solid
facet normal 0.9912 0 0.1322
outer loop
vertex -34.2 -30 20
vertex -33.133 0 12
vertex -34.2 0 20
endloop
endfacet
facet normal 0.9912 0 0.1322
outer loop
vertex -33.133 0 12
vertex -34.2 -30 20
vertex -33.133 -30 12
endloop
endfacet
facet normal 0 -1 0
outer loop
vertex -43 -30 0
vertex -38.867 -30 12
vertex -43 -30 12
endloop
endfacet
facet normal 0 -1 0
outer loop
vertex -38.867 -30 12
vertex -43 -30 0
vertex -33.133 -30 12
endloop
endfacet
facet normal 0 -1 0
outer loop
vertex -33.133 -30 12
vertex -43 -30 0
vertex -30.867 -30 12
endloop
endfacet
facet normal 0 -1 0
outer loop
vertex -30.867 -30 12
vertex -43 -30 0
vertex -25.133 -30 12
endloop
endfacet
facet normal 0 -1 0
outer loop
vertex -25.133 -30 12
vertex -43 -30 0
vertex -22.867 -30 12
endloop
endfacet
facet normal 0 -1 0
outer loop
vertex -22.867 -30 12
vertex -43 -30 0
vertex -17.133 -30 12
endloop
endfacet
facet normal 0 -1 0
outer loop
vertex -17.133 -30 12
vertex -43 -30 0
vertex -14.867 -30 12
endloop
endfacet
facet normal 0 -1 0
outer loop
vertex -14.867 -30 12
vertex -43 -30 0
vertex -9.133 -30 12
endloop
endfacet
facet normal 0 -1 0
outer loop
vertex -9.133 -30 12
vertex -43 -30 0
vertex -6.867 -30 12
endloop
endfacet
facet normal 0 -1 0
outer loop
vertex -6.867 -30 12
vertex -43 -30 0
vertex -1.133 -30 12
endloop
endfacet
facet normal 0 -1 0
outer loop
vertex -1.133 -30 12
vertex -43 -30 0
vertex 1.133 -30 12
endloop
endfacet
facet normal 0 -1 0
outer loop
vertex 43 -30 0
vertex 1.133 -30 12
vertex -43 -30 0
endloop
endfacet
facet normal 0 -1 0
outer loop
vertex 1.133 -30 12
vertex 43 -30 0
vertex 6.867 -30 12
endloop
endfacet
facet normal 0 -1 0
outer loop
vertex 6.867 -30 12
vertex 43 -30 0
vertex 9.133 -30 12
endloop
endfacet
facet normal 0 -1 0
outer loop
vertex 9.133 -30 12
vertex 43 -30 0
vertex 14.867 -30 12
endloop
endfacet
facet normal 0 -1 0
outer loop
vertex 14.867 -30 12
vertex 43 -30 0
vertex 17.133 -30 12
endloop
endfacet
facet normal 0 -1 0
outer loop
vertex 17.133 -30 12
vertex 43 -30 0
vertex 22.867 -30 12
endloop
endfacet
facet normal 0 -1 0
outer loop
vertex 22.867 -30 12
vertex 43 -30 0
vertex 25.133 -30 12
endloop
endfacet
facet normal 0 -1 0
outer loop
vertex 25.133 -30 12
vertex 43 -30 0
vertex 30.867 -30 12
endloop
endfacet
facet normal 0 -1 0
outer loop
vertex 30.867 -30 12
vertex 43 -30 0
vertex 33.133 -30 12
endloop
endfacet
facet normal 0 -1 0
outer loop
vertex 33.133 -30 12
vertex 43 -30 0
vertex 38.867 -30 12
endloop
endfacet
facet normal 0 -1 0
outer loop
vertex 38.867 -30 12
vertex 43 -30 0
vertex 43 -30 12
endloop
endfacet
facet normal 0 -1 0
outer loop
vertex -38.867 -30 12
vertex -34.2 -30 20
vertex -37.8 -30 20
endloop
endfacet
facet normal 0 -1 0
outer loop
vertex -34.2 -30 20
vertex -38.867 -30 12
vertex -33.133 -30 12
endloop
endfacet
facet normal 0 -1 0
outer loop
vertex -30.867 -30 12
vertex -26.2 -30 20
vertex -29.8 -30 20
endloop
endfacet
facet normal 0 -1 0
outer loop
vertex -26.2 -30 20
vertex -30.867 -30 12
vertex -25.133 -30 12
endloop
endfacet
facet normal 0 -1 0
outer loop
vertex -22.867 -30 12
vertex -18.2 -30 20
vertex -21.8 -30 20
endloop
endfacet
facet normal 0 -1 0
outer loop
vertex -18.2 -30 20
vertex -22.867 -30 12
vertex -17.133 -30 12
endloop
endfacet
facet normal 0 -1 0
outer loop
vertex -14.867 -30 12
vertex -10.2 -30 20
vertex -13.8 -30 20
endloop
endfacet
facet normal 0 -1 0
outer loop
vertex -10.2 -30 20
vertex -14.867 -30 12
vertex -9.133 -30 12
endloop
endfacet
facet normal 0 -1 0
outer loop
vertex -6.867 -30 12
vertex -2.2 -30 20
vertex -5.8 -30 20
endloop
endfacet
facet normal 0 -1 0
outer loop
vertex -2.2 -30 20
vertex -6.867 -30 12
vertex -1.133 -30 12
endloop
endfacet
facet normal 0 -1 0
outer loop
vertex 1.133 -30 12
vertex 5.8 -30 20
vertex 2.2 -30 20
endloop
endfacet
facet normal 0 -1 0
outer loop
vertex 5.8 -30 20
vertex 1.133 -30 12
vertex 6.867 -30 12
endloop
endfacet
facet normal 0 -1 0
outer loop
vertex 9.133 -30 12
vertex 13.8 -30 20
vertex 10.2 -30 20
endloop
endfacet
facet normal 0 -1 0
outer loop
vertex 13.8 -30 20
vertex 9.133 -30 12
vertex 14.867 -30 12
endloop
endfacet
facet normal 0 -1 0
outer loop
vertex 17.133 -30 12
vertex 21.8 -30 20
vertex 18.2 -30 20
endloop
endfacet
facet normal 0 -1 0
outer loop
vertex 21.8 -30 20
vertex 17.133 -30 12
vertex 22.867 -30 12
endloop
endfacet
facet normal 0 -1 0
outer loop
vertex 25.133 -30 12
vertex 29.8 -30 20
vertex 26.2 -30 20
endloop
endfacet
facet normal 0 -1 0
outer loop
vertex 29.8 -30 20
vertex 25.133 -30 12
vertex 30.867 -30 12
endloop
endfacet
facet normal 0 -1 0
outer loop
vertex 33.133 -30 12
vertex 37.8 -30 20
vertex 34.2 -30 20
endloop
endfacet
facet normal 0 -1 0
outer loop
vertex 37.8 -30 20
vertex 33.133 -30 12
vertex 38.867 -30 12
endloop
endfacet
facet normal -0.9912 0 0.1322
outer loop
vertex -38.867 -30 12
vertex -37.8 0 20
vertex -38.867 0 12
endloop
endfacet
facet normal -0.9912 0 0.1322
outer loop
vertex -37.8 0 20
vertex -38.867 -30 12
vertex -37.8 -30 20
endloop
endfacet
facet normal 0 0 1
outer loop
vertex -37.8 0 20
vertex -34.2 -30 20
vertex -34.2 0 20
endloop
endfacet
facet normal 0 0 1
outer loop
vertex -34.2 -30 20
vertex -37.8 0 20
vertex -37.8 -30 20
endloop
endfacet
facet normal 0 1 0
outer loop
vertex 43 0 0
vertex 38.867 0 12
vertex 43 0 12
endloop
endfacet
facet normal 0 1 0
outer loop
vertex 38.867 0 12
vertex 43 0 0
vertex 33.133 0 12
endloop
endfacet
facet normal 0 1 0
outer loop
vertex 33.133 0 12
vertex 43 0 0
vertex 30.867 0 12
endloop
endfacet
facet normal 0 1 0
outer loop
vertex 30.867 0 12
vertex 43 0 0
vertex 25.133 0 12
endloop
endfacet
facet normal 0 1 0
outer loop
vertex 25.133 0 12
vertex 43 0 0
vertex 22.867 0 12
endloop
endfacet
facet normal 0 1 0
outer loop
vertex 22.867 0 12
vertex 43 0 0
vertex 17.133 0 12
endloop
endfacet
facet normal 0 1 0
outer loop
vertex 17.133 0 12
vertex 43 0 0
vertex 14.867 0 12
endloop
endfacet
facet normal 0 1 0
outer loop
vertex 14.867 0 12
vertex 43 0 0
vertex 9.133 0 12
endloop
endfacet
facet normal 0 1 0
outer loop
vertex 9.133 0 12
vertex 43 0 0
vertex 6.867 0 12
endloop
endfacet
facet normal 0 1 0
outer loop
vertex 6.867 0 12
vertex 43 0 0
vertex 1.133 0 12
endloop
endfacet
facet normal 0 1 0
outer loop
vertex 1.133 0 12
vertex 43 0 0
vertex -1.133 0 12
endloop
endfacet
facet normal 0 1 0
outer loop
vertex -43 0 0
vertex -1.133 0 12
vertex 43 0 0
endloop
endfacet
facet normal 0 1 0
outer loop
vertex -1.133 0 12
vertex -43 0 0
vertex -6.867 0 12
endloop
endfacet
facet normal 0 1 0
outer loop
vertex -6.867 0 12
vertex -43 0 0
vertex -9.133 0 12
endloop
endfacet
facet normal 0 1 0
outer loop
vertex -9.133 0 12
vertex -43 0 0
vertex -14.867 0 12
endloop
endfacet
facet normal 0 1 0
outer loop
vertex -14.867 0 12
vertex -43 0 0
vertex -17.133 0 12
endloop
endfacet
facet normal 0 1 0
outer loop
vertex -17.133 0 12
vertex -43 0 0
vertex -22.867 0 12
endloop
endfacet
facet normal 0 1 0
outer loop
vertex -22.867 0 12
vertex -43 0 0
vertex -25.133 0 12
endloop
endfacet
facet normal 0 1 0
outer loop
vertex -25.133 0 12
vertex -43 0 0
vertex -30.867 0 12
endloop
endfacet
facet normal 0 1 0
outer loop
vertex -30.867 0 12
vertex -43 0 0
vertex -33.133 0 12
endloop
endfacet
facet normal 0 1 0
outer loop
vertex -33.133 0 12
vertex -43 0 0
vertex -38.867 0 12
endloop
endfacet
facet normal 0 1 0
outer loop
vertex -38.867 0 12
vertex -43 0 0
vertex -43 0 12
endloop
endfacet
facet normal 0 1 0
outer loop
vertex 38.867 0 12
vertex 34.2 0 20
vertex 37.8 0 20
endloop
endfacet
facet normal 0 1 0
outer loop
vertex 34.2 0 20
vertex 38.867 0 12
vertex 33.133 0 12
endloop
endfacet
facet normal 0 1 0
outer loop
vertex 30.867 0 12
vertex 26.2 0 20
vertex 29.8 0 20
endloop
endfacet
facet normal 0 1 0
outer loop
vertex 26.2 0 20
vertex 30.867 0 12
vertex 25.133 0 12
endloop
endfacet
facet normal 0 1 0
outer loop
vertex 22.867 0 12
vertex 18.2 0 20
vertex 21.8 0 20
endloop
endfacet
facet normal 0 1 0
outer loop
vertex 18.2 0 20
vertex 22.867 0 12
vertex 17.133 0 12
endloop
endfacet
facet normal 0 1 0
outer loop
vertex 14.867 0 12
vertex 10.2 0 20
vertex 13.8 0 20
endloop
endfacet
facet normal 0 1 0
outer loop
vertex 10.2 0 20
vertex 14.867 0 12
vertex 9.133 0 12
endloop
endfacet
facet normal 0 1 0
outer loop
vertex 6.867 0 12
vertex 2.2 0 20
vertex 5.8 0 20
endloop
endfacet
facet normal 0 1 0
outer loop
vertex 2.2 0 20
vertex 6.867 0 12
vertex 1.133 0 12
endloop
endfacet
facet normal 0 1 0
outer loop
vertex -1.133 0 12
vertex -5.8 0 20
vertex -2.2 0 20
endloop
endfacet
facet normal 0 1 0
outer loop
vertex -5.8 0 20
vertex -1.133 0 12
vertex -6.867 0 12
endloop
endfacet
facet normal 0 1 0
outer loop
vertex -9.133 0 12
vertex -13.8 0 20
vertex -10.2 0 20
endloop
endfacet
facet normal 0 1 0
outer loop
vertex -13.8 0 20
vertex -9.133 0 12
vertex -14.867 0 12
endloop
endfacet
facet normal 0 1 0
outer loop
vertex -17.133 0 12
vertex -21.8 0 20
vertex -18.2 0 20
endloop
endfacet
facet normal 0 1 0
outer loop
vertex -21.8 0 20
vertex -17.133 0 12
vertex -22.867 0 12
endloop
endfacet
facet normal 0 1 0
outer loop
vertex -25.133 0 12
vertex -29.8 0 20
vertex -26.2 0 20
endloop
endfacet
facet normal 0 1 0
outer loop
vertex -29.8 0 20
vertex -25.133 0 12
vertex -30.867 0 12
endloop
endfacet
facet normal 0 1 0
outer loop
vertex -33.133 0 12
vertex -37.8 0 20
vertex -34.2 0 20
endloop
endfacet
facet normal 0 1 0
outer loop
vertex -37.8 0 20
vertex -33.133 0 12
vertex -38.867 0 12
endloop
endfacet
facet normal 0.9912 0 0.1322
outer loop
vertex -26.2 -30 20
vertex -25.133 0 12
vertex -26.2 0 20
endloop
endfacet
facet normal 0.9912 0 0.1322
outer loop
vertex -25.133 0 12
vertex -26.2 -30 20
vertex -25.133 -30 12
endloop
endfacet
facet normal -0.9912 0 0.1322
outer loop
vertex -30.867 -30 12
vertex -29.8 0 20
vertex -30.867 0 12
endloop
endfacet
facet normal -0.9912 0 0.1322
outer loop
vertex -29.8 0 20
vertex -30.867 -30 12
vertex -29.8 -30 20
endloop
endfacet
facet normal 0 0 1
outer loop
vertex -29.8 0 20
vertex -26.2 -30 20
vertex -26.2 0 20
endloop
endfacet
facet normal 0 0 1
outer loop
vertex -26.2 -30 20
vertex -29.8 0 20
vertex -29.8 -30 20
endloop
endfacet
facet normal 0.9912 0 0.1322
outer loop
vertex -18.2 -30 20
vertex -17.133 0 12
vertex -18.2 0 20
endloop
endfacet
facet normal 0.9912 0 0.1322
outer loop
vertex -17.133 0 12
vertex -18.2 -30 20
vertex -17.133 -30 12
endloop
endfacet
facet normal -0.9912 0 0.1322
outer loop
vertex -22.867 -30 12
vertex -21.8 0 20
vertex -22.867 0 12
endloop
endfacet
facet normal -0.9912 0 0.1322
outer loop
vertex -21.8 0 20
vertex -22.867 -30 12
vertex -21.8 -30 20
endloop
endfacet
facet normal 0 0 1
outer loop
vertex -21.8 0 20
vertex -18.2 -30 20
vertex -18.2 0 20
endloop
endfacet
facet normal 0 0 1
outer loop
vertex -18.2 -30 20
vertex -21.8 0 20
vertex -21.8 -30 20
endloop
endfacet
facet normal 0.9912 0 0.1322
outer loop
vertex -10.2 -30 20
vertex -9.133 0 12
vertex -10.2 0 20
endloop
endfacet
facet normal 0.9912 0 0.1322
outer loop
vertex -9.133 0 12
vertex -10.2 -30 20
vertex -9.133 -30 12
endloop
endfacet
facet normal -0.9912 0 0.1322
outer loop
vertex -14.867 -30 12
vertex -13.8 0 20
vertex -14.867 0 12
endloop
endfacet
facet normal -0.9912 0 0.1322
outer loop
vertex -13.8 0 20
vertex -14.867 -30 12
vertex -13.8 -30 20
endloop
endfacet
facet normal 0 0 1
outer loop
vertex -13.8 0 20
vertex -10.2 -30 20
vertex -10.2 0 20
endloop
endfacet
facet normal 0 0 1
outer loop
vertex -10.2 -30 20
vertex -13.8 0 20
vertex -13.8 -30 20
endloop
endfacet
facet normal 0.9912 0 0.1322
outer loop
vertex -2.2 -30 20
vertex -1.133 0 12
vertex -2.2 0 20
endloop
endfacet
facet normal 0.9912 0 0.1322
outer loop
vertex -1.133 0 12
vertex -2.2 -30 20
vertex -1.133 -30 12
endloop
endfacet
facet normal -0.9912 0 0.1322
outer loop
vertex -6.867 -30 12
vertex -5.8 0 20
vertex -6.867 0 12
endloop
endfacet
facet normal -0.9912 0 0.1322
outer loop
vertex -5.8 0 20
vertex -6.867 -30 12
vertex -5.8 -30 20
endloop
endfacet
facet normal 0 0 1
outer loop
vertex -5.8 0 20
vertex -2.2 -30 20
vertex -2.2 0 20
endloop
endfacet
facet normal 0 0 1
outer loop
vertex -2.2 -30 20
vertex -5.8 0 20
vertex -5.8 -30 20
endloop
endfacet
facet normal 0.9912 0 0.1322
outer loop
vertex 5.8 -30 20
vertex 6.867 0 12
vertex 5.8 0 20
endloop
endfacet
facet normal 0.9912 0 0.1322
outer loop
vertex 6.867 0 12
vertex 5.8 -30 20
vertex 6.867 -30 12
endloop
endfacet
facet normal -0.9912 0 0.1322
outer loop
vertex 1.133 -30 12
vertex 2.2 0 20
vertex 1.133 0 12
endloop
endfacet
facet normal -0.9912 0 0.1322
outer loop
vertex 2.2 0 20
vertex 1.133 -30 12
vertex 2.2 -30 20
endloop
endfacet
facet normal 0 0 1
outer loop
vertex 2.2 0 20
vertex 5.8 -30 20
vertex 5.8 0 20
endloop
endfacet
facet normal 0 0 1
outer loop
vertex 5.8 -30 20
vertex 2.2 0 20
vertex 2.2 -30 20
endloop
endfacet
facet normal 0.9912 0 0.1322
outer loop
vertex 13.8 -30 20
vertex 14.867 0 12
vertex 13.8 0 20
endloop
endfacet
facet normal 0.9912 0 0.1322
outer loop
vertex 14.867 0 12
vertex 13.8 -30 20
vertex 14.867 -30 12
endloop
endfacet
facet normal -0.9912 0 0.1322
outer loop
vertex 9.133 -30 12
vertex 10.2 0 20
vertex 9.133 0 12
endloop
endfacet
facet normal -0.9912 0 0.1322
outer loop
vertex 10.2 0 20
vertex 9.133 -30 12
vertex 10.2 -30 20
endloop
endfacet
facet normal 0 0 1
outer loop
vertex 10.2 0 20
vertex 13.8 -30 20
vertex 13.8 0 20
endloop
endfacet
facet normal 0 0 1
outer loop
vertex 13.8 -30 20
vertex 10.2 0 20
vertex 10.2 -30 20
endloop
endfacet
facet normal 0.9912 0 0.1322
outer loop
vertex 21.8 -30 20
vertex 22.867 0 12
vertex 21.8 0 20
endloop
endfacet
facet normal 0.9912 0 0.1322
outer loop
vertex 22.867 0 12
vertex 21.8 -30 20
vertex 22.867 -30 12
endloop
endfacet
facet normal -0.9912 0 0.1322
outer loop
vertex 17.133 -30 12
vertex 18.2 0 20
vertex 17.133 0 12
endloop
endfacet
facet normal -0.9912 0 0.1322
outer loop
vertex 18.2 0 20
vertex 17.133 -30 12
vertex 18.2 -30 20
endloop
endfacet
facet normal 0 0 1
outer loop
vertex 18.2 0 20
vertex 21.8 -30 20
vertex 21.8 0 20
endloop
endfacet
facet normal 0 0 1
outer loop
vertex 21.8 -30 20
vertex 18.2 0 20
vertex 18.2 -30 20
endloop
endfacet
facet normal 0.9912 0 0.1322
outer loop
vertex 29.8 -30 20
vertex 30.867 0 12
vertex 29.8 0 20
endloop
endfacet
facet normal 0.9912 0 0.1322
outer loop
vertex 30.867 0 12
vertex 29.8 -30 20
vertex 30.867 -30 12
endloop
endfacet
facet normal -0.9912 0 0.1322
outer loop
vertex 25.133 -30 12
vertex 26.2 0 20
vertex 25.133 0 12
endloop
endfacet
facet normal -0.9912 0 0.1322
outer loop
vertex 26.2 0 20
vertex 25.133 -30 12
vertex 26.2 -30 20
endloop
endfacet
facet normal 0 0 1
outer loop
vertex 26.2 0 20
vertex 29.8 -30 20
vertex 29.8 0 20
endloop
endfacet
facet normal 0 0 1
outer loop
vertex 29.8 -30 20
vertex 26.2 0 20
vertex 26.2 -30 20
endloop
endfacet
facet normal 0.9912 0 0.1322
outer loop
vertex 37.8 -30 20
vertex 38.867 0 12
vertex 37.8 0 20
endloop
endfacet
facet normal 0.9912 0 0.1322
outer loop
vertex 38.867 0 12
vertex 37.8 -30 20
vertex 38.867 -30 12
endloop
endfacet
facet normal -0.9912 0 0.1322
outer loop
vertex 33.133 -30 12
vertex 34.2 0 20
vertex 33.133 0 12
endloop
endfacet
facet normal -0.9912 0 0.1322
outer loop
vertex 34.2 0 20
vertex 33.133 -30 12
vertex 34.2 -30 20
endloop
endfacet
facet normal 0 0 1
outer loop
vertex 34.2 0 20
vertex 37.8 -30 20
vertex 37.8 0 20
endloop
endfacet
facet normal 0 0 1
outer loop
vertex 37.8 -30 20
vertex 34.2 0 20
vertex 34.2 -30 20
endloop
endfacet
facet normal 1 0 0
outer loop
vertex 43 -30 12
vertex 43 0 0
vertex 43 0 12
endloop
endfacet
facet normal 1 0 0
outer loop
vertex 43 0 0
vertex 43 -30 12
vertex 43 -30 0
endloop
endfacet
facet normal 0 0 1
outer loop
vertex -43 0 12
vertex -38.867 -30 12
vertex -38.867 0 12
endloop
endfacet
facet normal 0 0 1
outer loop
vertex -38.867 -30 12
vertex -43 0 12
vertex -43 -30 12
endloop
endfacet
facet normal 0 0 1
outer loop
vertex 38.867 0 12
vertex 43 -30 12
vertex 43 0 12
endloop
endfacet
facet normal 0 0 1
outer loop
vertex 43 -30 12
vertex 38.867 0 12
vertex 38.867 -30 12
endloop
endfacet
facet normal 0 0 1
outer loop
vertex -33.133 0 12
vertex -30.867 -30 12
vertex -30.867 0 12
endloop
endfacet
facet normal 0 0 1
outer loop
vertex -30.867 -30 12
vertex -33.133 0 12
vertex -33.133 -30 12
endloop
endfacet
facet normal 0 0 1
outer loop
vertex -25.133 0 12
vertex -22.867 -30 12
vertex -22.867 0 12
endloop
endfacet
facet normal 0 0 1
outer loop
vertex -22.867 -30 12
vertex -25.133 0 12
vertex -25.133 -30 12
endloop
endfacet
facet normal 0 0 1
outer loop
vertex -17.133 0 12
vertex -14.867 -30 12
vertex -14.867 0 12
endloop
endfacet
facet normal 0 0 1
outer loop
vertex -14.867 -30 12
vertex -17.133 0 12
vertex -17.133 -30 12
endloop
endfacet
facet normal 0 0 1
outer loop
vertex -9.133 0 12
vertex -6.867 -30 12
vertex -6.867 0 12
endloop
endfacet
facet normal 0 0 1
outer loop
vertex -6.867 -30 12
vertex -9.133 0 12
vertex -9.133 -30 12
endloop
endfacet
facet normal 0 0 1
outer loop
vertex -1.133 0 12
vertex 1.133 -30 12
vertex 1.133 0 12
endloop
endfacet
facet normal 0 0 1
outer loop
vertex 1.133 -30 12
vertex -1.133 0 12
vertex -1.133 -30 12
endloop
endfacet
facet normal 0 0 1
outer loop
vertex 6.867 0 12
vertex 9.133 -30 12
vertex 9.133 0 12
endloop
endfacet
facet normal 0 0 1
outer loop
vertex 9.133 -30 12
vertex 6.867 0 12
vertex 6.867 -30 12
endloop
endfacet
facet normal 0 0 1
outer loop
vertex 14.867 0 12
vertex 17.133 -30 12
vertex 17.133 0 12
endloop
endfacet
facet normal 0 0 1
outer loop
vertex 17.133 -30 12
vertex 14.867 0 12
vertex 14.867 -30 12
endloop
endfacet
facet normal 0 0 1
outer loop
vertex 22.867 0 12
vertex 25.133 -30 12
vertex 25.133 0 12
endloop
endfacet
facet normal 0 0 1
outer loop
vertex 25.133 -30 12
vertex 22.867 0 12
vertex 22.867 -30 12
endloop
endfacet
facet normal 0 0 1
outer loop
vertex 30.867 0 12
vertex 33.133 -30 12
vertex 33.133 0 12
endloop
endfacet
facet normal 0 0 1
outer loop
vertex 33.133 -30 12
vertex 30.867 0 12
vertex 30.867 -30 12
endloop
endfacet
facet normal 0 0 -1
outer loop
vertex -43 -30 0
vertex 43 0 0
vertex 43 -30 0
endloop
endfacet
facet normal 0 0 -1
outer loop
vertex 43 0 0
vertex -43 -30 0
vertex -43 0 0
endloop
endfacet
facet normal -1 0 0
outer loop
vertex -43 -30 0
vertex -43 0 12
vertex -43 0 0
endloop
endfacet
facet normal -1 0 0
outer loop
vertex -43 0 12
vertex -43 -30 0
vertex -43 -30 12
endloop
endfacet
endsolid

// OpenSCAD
$fn = 32;

// ----------------------------------------------------------------------
// Toothed rack, 10 teeth
// 8 mm pitch, 8 mm teeth
// ----------------------------------------------------------------------

// --- parameters (mm) ---
bar_w = 30;     // bar width (Y)
bar_h = 12;     // bar height (Z)
teeth = 10;     // number of teeth
pitch = 8;      // tooth pitch
tooth_h = 8;    // tooth height above the bar
root_w = 6;     // tooth width at the root
crest_w = 3.6;  // tooth width at the crest

// --- derived feature positions (mm) ---
span = (teeth - 1) * pitch;  // = 72   distance between the outer teeth
bar_l = span + root_w + 8;   // = 86   bar length: teeth plus 4 mm at each end
tooth_x = -span / 2;         // = -36   X of the first tooth
height = bar_h + tooth_h;    // = 20   overall height
feature_centers = [
  [tooth_x + 0 * pitch, -bar_w / 2],
  [tooth_x + 1 * pitch, -bar_w / 2],
  [tooth_x + 2 * pitch, -bar_w / 2],
  [tooth_x + 3 * pitch, -bar_w / 2],
  [tooth_x + 4 * pitch, -bar_w / 2],
  [tooth_x + 5 * pitch, -bar_w / 2],
  [tooth_x + 6 * pitch, -bar_w / 2],
  [tooth_x + 7 * pitch, -bar_w / 2],
  [tooth_x + 8 * pitch, -bar_w / 2],
  [tooth_x + 9 * pitch, -bar_w / 2]
];   // tooth centre line, drives the tooth loop

// bar with a rack of teeth, one extruded trapezoium per centre
module rack_tooth() {
  linear_extrude(height = bar_w)
    polygon(points = [
      [0, 0],
      [root_w, 0],
      [root_w / 2 + crest_w / 2, tooth_h + 1],
      [root_w / 2 - crest_w / 2, tooth_h + 1]
    ]);
}

union() {
  translate([-bar_l / 2, -bar_w, 0]) cube([bar_l, bar_w, bar_h]);
  for (centre = feature_centers)
    translate([centre[0] - root_w / 2, 0, bar_h - 1]) rotate([90, 0, 0]) rack_tooth();
}
